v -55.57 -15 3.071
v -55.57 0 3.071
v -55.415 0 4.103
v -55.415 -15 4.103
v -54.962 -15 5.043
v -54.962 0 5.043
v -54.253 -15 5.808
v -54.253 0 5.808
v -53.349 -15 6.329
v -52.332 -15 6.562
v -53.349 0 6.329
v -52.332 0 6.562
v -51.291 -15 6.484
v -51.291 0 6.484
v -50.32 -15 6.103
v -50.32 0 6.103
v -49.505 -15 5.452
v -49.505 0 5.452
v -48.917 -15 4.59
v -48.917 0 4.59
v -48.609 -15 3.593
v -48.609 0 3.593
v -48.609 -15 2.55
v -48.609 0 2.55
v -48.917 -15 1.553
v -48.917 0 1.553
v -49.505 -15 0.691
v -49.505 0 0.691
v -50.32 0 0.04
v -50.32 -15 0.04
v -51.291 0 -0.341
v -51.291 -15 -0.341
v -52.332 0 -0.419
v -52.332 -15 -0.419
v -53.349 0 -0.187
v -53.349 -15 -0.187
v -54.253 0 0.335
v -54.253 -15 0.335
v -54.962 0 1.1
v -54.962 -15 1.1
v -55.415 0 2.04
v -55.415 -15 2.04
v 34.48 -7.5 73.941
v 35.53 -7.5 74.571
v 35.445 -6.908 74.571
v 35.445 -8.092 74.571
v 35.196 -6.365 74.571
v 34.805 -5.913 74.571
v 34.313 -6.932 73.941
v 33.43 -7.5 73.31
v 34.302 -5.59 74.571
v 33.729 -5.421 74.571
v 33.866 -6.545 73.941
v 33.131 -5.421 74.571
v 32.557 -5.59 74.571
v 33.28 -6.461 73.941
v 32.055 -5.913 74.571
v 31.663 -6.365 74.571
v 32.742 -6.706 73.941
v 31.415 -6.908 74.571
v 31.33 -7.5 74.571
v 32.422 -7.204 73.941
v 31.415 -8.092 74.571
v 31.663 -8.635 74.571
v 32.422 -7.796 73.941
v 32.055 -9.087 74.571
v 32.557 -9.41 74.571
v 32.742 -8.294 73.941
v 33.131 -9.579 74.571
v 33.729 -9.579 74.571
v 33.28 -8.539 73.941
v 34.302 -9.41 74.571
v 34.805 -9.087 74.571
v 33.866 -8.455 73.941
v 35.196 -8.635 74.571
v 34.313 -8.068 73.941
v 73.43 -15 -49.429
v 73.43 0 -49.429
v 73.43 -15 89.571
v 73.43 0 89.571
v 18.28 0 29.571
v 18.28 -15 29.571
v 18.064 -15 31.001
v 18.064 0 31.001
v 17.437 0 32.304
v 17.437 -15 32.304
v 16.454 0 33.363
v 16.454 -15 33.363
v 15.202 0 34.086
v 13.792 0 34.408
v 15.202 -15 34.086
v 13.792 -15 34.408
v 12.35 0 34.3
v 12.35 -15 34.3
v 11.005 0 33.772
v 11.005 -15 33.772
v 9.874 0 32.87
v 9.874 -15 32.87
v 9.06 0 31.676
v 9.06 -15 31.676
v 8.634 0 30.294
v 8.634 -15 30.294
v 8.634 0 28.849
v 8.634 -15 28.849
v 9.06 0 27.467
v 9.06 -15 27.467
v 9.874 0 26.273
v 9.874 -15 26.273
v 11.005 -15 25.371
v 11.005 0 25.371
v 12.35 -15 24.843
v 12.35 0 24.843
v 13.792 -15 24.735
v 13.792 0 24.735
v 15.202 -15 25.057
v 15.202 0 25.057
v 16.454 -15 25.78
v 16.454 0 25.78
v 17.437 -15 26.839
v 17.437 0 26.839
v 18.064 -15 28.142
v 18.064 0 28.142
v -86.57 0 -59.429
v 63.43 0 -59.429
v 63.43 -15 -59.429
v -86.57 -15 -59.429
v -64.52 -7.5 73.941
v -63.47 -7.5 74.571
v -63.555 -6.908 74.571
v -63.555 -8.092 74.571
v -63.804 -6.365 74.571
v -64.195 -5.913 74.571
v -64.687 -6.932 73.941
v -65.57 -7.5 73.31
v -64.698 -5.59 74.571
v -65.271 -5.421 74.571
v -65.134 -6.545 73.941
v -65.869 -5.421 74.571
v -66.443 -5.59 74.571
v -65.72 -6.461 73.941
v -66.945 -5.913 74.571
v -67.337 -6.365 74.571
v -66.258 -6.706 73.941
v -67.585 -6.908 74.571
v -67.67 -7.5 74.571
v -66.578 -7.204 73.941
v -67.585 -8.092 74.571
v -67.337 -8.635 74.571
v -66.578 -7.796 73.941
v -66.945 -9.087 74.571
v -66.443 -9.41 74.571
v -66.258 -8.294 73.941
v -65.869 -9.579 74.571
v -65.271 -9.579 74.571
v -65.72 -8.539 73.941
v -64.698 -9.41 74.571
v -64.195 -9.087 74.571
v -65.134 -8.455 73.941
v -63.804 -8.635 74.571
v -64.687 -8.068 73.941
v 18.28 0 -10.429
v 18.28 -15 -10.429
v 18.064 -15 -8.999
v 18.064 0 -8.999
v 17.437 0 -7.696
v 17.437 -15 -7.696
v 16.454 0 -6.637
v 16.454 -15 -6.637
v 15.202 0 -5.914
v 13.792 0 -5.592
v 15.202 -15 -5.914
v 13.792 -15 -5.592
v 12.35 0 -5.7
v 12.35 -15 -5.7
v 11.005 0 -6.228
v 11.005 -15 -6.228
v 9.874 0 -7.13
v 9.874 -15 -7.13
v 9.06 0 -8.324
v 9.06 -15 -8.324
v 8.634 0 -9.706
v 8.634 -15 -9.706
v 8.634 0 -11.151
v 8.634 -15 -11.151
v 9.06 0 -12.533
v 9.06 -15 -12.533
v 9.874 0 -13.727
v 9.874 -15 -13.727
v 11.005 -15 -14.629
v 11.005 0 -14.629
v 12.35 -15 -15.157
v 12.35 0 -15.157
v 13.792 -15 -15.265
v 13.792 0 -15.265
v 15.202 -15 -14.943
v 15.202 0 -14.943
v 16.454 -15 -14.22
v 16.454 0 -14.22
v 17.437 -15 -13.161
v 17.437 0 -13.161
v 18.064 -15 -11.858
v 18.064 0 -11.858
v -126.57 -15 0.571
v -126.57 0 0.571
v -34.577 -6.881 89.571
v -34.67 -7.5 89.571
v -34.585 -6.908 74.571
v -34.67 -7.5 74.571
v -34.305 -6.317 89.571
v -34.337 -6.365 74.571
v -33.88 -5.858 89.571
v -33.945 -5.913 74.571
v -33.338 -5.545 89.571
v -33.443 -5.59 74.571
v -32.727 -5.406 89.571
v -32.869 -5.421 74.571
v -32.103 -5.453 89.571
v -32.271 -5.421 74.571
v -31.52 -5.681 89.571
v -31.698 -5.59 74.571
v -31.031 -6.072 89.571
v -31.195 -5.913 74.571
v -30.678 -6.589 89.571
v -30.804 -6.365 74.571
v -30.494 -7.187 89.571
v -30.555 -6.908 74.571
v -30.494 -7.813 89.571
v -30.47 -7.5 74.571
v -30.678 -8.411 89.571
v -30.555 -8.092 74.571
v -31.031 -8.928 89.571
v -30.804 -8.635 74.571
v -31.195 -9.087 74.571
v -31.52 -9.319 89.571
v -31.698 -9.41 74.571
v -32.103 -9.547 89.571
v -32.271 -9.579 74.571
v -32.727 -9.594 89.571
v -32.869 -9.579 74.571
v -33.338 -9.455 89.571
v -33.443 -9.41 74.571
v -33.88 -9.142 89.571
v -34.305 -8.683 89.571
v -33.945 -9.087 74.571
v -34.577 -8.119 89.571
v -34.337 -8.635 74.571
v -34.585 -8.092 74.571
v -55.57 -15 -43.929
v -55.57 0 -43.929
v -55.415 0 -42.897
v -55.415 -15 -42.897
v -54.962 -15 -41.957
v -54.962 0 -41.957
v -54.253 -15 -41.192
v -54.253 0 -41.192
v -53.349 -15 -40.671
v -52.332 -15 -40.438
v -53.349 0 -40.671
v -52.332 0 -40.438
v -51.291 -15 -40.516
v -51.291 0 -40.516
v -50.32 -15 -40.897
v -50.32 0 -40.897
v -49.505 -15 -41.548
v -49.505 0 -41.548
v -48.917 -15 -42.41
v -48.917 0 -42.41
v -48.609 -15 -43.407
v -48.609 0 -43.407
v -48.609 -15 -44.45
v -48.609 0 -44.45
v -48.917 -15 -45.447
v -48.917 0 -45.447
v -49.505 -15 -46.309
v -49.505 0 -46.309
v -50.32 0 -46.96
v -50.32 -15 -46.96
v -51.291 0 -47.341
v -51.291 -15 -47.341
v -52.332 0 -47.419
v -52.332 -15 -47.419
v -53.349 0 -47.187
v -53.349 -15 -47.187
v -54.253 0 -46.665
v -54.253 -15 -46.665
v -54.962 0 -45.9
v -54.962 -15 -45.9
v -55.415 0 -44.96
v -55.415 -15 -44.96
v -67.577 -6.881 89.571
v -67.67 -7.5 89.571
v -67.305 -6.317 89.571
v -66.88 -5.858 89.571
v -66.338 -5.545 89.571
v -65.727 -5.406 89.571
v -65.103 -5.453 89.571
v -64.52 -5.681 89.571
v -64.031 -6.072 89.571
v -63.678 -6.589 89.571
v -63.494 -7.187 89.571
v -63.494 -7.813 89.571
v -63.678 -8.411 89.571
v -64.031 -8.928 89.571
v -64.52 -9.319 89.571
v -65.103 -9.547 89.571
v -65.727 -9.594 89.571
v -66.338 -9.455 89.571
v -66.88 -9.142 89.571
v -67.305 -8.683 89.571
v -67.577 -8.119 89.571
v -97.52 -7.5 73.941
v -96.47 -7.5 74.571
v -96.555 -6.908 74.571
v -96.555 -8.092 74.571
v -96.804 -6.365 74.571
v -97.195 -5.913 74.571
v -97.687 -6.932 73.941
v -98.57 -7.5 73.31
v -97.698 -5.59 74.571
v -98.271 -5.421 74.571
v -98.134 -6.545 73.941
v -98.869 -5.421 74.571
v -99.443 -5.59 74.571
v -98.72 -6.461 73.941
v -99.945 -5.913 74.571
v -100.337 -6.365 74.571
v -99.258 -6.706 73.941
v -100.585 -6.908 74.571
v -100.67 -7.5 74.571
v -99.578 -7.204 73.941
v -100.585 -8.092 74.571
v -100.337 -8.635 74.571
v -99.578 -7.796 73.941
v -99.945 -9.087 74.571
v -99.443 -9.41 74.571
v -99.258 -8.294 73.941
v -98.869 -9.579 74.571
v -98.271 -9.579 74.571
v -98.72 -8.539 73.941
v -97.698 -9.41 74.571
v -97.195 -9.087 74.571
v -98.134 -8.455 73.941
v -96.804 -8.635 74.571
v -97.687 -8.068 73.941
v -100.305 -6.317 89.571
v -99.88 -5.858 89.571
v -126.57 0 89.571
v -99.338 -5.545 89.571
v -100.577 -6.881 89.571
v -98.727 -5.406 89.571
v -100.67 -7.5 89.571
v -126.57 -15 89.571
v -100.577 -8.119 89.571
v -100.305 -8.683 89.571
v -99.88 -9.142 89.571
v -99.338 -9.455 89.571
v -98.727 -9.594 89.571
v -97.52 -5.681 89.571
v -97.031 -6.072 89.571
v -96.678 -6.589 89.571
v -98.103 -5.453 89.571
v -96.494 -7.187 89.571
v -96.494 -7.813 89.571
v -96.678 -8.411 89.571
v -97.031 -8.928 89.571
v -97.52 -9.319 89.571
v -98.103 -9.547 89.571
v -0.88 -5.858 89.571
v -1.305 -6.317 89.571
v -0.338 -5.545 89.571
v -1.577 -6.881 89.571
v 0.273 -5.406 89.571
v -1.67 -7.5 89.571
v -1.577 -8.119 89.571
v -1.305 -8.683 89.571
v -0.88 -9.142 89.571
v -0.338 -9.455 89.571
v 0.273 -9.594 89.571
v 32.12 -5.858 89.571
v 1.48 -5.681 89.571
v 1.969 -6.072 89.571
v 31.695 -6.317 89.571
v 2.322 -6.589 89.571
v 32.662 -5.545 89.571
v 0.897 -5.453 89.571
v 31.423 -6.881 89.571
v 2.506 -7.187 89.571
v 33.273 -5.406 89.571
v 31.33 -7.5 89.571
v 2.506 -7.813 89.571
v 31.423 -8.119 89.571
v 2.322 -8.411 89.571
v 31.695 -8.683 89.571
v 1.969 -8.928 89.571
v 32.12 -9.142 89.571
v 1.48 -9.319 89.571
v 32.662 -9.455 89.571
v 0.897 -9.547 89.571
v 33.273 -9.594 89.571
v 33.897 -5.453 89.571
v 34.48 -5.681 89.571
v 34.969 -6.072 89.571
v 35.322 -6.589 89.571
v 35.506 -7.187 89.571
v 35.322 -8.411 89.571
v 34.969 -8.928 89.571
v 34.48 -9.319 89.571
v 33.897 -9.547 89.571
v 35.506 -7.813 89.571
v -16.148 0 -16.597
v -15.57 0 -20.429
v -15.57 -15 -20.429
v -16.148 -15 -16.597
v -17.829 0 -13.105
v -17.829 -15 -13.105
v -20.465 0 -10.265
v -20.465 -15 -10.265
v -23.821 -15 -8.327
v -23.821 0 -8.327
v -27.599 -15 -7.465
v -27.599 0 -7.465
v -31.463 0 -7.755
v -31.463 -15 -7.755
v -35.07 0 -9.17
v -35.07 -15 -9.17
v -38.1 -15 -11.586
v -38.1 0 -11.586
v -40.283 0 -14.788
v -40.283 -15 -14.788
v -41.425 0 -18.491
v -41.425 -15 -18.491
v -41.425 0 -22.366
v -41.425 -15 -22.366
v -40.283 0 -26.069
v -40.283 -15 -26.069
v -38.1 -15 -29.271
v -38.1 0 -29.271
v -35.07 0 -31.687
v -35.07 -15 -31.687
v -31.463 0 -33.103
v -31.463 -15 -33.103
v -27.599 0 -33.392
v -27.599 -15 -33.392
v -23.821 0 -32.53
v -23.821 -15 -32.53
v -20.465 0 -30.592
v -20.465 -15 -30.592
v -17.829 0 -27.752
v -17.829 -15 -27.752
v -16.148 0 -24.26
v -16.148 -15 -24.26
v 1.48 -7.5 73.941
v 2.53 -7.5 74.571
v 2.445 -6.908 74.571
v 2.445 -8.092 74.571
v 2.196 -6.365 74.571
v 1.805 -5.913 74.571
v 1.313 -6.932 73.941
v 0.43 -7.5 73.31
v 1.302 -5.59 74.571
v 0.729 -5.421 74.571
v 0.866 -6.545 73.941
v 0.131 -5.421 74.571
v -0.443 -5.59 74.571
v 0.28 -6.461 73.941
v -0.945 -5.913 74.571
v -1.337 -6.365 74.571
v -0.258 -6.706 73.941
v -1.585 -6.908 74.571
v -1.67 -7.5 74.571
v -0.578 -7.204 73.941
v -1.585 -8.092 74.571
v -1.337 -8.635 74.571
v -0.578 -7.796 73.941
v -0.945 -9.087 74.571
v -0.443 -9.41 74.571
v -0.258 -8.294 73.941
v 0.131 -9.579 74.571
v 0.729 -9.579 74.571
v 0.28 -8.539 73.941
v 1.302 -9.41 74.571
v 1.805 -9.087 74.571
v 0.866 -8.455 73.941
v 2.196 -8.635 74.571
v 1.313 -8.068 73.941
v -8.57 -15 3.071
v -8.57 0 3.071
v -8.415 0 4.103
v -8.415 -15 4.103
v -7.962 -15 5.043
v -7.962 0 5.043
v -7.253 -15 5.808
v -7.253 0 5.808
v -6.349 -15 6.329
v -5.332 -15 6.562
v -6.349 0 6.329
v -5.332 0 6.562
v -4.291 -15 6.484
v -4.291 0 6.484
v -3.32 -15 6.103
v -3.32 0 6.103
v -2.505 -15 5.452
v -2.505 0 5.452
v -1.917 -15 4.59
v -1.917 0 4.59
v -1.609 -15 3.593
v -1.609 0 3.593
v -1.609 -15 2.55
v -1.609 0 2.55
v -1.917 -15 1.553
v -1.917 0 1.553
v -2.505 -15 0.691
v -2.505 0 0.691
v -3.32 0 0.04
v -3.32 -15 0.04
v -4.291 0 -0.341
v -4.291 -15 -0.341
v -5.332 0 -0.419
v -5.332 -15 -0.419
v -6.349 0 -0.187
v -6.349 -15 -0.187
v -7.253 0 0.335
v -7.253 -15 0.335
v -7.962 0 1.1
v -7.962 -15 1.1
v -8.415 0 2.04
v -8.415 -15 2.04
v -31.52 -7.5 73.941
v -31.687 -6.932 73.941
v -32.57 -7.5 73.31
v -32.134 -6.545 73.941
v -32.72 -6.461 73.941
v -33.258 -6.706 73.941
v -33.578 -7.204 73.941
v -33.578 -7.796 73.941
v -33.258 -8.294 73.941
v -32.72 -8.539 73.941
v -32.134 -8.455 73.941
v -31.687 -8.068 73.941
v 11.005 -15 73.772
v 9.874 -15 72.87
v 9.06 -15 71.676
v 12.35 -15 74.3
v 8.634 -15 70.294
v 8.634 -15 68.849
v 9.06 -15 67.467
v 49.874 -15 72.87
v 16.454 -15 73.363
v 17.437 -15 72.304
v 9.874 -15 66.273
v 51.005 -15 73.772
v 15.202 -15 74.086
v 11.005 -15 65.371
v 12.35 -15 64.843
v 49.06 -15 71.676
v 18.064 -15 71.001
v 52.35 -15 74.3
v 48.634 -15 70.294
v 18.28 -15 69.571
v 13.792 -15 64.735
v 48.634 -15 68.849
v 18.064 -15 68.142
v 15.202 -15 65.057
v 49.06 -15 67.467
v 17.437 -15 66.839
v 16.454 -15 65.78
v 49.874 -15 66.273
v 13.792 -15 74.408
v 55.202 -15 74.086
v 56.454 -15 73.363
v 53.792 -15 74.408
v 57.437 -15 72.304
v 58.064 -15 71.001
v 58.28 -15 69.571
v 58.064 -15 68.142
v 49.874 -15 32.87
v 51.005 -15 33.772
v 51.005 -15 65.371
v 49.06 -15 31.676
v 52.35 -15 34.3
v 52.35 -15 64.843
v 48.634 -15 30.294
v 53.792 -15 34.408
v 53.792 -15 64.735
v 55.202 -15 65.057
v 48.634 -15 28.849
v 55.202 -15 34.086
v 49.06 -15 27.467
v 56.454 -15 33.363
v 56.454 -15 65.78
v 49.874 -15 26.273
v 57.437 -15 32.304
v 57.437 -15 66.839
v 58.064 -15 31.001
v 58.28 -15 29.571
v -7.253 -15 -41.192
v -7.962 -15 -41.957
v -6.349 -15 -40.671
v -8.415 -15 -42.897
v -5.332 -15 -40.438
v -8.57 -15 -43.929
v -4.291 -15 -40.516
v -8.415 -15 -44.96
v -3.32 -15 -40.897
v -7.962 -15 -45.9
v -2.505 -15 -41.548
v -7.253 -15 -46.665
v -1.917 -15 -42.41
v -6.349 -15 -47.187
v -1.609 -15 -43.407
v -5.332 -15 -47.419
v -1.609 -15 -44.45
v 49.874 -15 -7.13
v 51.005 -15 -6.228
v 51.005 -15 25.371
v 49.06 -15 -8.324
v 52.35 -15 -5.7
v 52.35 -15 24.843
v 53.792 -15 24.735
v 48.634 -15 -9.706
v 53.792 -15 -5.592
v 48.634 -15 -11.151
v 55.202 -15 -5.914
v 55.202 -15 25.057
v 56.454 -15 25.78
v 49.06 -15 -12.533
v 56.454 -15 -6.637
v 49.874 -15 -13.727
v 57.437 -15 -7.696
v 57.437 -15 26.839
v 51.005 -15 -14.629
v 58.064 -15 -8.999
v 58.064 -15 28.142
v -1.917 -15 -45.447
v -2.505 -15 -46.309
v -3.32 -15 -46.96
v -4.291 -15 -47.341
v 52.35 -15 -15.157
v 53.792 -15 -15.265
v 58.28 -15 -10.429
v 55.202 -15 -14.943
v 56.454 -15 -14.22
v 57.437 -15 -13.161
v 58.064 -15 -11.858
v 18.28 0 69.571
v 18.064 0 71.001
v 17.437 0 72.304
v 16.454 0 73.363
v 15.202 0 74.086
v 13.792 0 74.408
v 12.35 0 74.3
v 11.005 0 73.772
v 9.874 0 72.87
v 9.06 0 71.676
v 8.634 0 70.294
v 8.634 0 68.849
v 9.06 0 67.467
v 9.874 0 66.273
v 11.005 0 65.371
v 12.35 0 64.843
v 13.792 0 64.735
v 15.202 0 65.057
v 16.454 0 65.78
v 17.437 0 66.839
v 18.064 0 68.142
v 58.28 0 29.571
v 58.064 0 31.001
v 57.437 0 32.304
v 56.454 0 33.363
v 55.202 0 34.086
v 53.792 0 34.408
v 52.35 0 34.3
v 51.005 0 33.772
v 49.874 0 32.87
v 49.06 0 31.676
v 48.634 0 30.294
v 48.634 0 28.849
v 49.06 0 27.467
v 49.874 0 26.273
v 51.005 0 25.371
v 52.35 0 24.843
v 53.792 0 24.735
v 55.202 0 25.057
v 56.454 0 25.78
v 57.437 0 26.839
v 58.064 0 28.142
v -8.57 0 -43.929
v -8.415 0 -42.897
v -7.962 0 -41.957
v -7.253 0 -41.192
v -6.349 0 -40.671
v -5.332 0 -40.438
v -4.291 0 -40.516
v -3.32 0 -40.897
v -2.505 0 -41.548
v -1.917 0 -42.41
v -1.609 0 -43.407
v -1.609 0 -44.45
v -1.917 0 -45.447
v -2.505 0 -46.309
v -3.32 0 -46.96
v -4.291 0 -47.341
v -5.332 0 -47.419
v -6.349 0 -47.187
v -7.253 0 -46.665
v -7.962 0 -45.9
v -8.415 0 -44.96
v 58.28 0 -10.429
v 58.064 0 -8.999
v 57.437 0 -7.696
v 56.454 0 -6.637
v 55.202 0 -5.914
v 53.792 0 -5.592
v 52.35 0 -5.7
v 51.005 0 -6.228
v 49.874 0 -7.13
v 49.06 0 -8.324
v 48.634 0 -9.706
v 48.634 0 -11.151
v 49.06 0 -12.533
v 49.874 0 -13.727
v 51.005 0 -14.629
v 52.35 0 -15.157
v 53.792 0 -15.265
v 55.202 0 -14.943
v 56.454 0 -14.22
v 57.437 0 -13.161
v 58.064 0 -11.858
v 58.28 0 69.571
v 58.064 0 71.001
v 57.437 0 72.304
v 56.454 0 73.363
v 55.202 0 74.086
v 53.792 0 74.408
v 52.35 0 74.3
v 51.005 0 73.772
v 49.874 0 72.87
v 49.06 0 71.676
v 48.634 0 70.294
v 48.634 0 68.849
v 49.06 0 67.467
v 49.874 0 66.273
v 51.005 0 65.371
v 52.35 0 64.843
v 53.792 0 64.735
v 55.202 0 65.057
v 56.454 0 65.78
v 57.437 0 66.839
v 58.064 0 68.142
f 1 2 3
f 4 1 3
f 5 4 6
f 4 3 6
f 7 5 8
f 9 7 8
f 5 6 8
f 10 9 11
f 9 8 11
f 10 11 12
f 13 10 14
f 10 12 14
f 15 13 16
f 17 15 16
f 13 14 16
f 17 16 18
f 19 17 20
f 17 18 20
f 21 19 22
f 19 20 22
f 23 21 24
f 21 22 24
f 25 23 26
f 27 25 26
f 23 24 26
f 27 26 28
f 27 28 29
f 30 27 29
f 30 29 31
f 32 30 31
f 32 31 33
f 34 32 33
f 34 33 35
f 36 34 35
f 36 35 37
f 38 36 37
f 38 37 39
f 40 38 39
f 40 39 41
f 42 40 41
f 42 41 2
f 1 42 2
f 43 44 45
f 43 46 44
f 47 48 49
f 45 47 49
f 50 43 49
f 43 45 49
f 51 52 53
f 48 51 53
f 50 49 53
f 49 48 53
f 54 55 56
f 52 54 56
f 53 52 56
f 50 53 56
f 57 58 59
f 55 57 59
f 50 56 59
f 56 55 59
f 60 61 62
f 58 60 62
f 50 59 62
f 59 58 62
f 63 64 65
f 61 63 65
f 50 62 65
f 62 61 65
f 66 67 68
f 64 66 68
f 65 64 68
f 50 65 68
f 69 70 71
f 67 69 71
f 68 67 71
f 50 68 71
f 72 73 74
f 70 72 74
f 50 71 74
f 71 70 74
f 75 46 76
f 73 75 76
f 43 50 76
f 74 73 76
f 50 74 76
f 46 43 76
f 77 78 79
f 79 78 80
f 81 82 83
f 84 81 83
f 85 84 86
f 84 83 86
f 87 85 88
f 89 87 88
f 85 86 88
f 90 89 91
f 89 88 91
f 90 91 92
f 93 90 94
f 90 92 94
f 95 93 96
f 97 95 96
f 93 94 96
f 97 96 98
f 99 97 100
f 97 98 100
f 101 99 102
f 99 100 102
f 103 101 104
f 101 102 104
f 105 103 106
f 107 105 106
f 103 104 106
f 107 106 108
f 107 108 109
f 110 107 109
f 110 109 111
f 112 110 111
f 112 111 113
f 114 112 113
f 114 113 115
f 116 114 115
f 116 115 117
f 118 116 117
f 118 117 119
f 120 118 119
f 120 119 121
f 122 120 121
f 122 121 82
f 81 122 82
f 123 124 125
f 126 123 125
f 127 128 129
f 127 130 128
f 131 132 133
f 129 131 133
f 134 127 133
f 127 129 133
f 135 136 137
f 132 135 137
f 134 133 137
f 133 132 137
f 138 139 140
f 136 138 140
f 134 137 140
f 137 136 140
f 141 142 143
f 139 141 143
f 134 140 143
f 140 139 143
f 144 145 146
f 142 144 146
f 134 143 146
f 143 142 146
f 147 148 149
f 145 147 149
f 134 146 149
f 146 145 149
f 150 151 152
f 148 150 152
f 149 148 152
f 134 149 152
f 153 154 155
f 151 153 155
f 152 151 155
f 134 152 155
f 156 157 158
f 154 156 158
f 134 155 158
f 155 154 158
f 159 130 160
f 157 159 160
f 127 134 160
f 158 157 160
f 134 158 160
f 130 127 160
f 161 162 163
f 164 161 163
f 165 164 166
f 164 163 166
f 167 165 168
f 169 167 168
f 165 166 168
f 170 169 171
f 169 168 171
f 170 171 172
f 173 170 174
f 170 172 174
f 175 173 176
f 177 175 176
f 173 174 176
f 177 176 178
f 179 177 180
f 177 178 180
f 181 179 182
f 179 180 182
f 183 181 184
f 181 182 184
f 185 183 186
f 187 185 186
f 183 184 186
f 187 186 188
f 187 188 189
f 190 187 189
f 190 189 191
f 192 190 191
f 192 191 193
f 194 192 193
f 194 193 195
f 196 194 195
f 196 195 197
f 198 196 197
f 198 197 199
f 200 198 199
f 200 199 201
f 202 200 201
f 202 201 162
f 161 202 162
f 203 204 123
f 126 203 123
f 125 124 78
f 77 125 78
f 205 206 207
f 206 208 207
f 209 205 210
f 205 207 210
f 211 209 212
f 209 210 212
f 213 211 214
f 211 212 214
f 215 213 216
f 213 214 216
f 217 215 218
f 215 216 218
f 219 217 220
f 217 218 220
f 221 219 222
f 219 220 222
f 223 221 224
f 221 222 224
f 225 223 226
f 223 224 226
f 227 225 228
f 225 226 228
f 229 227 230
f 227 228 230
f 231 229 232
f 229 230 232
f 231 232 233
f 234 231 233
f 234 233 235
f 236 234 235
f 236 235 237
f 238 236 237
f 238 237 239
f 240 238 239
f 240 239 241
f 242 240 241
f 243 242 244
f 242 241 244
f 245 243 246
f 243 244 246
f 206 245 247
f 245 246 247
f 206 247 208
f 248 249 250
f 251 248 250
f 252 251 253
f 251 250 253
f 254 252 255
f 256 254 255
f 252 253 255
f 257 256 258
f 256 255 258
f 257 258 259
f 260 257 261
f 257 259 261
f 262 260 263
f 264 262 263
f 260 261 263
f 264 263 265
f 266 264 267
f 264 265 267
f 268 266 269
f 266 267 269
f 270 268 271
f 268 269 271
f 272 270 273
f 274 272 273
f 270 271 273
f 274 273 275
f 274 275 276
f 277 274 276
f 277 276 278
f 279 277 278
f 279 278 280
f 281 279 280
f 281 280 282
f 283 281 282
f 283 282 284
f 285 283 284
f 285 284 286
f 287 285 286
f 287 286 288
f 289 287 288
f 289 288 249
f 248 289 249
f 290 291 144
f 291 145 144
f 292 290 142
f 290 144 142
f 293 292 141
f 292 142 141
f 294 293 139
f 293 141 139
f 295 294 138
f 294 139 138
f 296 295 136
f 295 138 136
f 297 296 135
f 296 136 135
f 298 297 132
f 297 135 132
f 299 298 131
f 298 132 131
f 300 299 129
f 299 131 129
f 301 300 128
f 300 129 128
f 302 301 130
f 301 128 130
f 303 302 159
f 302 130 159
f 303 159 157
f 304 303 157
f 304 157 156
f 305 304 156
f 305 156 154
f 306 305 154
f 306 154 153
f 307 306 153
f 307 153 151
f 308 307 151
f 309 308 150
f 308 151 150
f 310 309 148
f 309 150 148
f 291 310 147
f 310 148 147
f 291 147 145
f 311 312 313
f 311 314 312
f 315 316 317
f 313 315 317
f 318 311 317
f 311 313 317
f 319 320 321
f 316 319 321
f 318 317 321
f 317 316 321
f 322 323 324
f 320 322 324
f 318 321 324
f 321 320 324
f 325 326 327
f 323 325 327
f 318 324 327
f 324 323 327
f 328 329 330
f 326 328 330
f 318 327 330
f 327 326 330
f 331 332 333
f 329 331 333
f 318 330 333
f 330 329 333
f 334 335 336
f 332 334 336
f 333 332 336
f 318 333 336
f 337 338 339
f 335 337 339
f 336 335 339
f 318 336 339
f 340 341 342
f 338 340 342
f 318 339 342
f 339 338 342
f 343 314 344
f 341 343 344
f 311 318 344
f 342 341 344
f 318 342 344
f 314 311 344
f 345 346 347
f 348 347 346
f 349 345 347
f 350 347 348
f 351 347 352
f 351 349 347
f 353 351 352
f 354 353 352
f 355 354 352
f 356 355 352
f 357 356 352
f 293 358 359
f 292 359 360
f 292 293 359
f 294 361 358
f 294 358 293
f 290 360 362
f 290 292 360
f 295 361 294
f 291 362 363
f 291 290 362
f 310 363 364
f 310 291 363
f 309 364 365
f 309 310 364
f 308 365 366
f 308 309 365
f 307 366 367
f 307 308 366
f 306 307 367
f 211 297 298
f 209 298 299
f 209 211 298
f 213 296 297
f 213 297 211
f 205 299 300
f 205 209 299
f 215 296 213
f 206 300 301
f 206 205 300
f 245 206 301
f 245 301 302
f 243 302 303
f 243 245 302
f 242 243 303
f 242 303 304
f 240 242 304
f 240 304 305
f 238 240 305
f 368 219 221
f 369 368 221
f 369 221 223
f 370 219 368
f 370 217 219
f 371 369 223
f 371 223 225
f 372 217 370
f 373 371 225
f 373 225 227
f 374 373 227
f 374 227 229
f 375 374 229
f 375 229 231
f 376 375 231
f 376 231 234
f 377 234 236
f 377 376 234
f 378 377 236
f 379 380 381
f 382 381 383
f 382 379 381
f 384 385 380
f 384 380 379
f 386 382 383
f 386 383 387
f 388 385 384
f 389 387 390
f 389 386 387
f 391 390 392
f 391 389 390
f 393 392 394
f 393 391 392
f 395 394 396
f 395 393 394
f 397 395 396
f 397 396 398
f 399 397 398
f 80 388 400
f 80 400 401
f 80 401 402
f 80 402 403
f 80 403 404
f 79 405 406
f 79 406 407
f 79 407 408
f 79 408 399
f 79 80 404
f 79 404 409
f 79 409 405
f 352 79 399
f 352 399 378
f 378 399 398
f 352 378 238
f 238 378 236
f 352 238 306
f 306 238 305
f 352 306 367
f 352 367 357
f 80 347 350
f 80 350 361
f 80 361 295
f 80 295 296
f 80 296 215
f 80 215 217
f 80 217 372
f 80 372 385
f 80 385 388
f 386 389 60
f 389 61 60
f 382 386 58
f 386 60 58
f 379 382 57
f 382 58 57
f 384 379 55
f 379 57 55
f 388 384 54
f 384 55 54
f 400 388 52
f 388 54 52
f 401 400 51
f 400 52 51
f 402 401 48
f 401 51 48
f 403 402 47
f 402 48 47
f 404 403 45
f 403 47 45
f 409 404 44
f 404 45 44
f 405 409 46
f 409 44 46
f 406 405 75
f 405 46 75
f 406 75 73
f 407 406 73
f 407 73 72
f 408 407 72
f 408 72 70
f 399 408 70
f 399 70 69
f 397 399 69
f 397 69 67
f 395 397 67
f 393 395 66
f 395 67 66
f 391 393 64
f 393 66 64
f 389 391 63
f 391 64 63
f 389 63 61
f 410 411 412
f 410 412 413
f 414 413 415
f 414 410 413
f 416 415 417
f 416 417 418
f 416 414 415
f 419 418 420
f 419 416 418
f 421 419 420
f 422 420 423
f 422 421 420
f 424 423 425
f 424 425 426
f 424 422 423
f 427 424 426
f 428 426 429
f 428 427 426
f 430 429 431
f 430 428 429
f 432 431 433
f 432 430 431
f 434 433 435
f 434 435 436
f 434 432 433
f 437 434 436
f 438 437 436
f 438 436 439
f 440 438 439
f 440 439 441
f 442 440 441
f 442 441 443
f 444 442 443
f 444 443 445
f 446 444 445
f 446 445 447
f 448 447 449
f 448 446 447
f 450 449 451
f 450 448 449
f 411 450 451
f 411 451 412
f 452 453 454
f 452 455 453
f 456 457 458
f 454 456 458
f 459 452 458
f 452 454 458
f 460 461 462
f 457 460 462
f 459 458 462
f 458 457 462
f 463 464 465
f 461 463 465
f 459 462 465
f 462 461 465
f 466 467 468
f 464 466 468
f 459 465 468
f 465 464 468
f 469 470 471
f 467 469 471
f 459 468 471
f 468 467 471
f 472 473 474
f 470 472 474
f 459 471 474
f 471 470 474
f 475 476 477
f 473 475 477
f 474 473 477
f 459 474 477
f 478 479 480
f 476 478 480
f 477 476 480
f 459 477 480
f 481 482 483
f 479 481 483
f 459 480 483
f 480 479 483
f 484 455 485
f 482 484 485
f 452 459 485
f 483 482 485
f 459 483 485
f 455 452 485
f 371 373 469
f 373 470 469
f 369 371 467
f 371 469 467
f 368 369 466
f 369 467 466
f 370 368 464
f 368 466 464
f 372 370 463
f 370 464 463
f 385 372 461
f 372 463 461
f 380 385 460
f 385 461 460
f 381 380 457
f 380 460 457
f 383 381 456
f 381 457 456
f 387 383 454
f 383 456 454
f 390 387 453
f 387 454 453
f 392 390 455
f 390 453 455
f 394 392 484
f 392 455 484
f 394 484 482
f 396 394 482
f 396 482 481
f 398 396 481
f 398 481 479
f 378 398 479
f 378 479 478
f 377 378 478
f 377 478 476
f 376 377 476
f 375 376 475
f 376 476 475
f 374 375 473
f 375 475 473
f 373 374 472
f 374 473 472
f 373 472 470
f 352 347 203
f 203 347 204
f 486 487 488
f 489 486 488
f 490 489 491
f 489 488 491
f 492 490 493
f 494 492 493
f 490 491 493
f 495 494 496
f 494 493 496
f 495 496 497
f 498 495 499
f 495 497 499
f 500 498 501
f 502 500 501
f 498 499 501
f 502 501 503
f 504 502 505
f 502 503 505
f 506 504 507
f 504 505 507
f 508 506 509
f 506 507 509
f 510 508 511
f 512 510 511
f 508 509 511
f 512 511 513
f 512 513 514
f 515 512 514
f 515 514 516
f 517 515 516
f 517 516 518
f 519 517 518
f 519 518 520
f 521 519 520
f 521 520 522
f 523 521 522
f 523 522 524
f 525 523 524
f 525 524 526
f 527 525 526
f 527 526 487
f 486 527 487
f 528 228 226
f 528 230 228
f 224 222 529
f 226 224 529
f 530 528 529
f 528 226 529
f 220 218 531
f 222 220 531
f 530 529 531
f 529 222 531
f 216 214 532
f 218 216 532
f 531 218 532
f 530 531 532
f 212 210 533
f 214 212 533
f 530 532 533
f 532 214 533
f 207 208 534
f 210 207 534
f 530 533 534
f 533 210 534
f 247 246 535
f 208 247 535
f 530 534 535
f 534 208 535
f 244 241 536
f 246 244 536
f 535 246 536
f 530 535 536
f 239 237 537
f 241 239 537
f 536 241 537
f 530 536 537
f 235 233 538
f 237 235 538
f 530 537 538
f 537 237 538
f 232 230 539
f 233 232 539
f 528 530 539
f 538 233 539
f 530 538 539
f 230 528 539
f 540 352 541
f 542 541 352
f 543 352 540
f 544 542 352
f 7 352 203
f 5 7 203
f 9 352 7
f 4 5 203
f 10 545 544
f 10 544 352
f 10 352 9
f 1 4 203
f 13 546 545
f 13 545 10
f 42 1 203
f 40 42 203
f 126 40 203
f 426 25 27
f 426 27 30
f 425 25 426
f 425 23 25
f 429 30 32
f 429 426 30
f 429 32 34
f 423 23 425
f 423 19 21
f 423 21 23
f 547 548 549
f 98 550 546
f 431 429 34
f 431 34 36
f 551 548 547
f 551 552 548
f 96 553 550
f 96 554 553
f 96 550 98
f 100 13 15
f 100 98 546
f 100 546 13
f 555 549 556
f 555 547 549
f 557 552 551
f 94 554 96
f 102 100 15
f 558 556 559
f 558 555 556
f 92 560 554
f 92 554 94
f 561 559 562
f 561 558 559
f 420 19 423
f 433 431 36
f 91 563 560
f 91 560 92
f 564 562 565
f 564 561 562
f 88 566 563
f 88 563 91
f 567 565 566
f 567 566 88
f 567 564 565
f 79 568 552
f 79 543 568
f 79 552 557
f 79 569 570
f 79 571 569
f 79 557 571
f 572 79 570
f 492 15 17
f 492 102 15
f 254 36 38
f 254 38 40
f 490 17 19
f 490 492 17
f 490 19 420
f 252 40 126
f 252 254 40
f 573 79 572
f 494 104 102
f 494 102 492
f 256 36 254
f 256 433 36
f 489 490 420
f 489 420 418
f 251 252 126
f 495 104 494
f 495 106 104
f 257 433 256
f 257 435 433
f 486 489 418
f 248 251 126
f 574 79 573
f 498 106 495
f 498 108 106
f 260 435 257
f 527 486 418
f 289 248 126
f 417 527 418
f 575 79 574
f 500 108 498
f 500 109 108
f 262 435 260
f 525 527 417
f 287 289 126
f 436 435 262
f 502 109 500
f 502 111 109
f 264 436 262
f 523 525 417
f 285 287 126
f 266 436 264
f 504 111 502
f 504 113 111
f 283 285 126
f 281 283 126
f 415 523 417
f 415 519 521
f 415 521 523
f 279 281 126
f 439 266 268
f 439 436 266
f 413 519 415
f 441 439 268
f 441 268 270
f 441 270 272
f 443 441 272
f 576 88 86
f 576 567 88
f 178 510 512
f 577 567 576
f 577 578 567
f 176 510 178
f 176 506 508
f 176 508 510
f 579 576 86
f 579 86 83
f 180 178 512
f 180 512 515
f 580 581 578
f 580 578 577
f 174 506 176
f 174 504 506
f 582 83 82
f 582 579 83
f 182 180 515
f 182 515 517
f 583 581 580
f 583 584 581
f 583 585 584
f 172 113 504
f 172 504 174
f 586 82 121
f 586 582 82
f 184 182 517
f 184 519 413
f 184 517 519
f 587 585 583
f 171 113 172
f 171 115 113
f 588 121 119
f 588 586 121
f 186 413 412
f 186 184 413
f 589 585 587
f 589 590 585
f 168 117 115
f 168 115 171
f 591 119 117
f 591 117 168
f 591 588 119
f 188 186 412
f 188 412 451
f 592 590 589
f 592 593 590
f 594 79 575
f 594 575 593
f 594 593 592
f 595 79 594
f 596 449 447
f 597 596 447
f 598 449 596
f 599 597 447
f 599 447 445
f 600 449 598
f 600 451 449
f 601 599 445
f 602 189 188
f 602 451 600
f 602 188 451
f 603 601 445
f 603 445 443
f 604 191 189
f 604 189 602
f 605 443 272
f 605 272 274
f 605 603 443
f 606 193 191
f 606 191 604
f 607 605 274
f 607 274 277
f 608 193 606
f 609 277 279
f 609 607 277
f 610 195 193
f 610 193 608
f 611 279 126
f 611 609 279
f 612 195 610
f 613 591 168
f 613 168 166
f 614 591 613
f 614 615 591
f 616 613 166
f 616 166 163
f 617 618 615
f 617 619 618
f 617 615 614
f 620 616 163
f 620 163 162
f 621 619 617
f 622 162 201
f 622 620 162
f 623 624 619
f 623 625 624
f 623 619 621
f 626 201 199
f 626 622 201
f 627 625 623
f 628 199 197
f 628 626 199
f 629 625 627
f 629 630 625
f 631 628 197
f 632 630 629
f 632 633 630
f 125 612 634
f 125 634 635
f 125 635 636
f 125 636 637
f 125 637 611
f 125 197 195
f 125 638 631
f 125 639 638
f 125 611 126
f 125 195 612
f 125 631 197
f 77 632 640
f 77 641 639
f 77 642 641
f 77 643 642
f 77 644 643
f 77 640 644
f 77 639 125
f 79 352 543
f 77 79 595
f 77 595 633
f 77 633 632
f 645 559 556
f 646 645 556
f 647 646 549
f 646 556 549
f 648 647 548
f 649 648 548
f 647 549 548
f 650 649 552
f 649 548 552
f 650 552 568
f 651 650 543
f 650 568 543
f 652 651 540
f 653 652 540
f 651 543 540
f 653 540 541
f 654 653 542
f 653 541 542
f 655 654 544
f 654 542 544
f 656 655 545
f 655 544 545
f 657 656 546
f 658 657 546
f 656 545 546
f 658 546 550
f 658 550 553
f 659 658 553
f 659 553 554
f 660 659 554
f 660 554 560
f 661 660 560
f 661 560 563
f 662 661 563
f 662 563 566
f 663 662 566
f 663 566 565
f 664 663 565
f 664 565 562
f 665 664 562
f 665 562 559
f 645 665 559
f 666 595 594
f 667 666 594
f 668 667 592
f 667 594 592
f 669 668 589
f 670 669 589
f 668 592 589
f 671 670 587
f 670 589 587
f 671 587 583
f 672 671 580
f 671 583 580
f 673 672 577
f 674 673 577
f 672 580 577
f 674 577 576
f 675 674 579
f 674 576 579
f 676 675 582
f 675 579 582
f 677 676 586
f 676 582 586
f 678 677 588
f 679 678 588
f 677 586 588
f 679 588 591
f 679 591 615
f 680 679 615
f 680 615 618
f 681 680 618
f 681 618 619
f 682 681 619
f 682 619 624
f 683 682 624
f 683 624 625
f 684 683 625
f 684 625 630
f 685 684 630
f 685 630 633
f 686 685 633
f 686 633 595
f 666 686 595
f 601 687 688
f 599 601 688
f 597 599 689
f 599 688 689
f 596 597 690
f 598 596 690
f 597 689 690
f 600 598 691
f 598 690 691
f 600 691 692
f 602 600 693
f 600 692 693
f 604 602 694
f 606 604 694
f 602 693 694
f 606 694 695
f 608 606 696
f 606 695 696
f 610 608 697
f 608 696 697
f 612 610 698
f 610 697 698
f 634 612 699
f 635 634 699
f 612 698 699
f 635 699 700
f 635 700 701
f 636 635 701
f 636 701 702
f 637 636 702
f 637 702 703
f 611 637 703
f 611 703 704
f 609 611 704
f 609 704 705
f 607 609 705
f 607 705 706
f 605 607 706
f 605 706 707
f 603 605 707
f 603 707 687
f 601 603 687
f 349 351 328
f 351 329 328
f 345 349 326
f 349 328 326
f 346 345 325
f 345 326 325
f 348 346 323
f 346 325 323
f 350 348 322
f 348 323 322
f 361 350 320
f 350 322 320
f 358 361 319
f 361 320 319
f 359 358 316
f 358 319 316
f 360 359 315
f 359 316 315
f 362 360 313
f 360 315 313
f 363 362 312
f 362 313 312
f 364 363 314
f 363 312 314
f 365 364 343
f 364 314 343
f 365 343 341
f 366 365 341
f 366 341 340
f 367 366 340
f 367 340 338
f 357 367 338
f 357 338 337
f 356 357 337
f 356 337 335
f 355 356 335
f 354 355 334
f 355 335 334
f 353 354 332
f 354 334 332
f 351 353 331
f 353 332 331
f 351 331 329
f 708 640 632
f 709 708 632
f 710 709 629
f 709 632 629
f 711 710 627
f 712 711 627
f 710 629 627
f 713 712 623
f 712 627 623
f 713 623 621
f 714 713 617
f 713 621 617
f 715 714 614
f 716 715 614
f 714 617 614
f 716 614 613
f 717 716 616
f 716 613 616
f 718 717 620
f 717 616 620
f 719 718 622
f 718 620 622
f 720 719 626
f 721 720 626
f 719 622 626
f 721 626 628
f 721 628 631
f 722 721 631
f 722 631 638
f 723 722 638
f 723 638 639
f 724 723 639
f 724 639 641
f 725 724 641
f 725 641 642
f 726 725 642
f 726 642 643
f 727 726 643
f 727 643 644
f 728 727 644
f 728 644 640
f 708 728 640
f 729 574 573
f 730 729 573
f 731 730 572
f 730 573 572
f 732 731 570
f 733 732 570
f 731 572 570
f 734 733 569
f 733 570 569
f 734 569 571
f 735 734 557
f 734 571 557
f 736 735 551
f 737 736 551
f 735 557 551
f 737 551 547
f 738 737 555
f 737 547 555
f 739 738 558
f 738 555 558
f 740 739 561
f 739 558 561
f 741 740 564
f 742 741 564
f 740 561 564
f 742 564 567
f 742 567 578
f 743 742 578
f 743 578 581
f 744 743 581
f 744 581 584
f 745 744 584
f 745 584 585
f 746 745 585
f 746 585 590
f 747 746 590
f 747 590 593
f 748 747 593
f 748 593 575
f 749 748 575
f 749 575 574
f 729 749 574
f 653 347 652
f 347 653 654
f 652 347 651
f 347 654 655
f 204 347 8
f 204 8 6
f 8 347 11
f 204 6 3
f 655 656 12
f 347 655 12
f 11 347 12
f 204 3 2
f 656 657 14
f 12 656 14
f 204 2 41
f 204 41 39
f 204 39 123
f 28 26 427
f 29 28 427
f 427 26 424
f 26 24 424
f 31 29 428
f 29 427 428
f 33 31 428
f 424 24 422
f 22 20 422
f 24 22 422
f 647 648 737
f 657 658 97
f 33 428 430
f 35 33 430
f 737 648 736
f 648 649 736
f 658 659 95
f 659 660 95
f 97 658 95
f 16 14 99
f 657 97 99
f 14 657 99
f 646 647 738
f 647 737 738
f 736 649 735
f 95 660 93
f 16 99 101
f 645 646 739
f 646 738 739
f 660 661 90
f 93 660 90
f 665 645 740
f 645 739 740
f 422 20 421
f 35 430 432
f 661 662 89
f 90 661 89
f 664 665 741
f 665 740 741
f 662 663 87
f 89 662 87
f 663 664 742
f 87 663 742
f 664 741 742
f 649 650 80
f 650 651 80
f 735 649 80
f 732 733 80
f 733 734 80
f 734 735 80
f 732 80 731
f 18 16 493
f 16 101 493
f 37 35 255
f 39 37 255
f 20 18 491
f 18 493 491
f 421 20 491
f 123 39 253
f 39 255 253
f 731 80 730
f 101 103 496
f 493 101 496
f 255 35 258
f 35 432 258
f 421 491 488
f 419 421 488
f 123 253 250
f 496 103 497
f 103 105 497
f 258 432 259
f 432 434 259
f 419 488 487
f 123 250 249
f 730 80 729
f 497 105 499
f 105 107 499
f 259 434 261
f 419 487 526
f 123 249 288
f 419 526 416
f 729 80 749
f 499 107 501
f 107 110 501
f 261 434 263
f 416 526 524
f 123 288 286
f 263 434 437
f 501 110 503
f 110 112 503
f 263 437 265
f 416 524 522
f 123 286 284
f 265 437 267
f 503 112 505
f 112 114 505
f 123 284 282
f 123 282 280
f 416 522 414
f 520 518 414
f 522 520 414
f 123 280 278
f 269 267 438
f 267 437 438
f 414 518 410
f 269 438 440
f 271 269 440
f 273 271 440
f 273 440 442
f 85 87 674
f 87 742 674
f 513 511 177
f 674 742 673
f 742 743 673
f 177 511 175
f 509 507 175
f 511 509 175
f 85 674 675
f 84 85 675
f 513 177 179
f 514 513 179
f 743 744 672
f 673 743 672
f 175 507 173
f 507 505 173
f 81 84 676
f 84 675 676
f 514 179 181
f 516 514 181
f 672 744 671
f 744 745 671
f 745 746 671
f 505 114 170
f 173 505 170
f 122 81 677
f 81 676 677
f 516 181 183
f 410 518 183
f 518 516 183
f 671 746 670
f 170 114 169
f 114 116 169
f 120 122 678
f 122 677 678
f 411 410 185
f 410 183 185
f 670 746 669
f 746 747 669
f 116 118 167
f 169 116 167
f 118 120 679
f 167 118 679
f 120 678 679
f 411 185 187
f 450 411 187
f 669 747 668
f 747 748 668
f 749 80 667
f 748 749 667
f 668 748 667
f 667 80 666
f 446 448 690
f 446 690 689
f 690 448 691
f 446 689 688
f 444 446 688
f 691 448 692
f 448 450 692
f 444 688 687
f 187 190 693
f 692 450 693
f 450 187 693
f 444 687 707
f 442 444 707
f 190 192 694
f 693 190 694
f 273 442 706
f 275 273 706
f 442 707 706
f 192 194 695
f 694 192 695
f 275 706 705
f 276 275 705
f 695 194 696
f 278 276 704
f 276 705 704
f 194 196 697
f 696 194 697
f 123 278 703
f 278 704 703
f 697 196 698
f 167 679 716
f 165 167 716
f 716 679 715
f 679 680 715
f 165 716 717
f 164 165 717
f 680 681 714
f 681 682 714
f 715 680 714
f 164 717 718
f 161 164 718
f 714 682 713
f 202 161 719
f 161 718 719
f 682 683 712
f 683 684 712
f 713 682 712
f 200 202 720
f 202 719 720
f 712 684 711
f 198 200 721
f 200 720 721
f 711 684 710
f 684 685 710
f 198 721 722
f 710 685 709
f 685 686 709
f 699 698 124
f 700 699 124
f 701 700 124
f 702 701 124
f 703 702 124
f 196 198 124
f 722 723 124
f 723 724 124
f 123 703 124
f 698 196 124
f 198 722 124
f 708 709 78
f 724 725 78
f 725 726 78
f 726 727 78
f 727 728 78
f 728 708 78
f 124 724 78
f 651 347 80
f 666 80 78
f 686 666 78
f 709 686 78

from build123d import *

# Parameters (mm, degrees)
F0_R      = 13
F1_DEPTH  = 15
F3_D      = 9.7
F5_D      = 7
F6_DEPTH  = 4
F7_DEPTH  = 55
F9_DEPTH  = 25
F11_D     = 4.2
F11_DEPTH = 15
F11_TIP   = 1.2618073


with BuildPart() as f1:
    # F0 (on Front) → F1 (new body)
    with BuildSketch(Plane.XZ):
        Polygon((73.4297142857, -49.4285714286), (73.4297142857, 89.5714285714), (-48.5702857143, 89.5714285714), (-67.5702857143, 89.5714285714), (-67.5702857143, 29.5714285714), (-67.5702857143, -59.4285714286), (63.4297142857, -59.4285714286), align=None)
        with Locations((-28.5702857143, -20.4285714286)):
            Circle(F0_R, mode=Mode.SUBTRACT)
    extrude(amount=F1_DEPTH)

    # F3 (through all)
    with Locations(Plane(origin=(0, 0, 0), x_dir=(-1, 0, 0), z_dir=(0, 1, 0))):
        with Locations((-53.4297142857, -10.4285714286), (-53.4297142857, 29.5714285714), (-53.4297142857, 69.5714285714), (-13.4297142857, 69.5714285714), (-13.4297142857, 29.5714285714), (-13.4297142857, -10.4285714286)):
            Hole(F3_D / 2)

    # F5 (through all)
    with Locations(Plane.XZ.offset(15)):
        with Locations((-52.0702857143, 3.0714285714), (-52.0702857143, -43.9285714286), (-5.0702857143, -43.9285714286), (-5.0702857143, 3.0714285714)):
            Hole(F5_D / 2)

    # F6 (add): a face of the model
    f6_faces = [f1.faces().sort_by_distance(p)[0] for p in [
        (-67.5702857143, -7.5, 15.0714285714),
    ]]
    extrude(f6_faces, amount=F6_DEPTH)

    # F7 (add): a face of the model
    f7_faces = [f1.faces().sort_by_distance(p)[0] for p in [
        (-71.5702857143, -7.5, 15.0714285714),
    ]]
    extrude(f7_faces, amount=F7_DEPTH)

    # F8 (on face) → F9 (cut)
    with BuildSketch(Plane(origin=(0, 0, 0), x_dir=(-1, 0, 0), z_dir=(0, 1, 0))):
        Polygon((126.5702857143, -59.4285714286), (126.5702857143, 0.5714285714), (86.5702857143, -59.4285714286), align=None)
    extrude(amount=-F9_DEPTH, mode=Mode.SUBTRACT)

    # F11
    with Locations(Plane.XY.offset(89.5714285714)):
        with Locations((-98.5702857143, -7.5), (-65.5702857143, -7.5), (-32.5702857143, -7.5), (0.4297142857, -7.5), (33.4297142857, -7.5)):
            Hole(F11_D / 2, depth=F11_DEPTH)
            with Locations((0, 0, -(F11_DEPTH + F11_TIP / 2))):  # 118° drill point
                Cone(0, F11_D / 2, F11_TIP, mode=Mode.SUBTRACT)


solid = f1.part
